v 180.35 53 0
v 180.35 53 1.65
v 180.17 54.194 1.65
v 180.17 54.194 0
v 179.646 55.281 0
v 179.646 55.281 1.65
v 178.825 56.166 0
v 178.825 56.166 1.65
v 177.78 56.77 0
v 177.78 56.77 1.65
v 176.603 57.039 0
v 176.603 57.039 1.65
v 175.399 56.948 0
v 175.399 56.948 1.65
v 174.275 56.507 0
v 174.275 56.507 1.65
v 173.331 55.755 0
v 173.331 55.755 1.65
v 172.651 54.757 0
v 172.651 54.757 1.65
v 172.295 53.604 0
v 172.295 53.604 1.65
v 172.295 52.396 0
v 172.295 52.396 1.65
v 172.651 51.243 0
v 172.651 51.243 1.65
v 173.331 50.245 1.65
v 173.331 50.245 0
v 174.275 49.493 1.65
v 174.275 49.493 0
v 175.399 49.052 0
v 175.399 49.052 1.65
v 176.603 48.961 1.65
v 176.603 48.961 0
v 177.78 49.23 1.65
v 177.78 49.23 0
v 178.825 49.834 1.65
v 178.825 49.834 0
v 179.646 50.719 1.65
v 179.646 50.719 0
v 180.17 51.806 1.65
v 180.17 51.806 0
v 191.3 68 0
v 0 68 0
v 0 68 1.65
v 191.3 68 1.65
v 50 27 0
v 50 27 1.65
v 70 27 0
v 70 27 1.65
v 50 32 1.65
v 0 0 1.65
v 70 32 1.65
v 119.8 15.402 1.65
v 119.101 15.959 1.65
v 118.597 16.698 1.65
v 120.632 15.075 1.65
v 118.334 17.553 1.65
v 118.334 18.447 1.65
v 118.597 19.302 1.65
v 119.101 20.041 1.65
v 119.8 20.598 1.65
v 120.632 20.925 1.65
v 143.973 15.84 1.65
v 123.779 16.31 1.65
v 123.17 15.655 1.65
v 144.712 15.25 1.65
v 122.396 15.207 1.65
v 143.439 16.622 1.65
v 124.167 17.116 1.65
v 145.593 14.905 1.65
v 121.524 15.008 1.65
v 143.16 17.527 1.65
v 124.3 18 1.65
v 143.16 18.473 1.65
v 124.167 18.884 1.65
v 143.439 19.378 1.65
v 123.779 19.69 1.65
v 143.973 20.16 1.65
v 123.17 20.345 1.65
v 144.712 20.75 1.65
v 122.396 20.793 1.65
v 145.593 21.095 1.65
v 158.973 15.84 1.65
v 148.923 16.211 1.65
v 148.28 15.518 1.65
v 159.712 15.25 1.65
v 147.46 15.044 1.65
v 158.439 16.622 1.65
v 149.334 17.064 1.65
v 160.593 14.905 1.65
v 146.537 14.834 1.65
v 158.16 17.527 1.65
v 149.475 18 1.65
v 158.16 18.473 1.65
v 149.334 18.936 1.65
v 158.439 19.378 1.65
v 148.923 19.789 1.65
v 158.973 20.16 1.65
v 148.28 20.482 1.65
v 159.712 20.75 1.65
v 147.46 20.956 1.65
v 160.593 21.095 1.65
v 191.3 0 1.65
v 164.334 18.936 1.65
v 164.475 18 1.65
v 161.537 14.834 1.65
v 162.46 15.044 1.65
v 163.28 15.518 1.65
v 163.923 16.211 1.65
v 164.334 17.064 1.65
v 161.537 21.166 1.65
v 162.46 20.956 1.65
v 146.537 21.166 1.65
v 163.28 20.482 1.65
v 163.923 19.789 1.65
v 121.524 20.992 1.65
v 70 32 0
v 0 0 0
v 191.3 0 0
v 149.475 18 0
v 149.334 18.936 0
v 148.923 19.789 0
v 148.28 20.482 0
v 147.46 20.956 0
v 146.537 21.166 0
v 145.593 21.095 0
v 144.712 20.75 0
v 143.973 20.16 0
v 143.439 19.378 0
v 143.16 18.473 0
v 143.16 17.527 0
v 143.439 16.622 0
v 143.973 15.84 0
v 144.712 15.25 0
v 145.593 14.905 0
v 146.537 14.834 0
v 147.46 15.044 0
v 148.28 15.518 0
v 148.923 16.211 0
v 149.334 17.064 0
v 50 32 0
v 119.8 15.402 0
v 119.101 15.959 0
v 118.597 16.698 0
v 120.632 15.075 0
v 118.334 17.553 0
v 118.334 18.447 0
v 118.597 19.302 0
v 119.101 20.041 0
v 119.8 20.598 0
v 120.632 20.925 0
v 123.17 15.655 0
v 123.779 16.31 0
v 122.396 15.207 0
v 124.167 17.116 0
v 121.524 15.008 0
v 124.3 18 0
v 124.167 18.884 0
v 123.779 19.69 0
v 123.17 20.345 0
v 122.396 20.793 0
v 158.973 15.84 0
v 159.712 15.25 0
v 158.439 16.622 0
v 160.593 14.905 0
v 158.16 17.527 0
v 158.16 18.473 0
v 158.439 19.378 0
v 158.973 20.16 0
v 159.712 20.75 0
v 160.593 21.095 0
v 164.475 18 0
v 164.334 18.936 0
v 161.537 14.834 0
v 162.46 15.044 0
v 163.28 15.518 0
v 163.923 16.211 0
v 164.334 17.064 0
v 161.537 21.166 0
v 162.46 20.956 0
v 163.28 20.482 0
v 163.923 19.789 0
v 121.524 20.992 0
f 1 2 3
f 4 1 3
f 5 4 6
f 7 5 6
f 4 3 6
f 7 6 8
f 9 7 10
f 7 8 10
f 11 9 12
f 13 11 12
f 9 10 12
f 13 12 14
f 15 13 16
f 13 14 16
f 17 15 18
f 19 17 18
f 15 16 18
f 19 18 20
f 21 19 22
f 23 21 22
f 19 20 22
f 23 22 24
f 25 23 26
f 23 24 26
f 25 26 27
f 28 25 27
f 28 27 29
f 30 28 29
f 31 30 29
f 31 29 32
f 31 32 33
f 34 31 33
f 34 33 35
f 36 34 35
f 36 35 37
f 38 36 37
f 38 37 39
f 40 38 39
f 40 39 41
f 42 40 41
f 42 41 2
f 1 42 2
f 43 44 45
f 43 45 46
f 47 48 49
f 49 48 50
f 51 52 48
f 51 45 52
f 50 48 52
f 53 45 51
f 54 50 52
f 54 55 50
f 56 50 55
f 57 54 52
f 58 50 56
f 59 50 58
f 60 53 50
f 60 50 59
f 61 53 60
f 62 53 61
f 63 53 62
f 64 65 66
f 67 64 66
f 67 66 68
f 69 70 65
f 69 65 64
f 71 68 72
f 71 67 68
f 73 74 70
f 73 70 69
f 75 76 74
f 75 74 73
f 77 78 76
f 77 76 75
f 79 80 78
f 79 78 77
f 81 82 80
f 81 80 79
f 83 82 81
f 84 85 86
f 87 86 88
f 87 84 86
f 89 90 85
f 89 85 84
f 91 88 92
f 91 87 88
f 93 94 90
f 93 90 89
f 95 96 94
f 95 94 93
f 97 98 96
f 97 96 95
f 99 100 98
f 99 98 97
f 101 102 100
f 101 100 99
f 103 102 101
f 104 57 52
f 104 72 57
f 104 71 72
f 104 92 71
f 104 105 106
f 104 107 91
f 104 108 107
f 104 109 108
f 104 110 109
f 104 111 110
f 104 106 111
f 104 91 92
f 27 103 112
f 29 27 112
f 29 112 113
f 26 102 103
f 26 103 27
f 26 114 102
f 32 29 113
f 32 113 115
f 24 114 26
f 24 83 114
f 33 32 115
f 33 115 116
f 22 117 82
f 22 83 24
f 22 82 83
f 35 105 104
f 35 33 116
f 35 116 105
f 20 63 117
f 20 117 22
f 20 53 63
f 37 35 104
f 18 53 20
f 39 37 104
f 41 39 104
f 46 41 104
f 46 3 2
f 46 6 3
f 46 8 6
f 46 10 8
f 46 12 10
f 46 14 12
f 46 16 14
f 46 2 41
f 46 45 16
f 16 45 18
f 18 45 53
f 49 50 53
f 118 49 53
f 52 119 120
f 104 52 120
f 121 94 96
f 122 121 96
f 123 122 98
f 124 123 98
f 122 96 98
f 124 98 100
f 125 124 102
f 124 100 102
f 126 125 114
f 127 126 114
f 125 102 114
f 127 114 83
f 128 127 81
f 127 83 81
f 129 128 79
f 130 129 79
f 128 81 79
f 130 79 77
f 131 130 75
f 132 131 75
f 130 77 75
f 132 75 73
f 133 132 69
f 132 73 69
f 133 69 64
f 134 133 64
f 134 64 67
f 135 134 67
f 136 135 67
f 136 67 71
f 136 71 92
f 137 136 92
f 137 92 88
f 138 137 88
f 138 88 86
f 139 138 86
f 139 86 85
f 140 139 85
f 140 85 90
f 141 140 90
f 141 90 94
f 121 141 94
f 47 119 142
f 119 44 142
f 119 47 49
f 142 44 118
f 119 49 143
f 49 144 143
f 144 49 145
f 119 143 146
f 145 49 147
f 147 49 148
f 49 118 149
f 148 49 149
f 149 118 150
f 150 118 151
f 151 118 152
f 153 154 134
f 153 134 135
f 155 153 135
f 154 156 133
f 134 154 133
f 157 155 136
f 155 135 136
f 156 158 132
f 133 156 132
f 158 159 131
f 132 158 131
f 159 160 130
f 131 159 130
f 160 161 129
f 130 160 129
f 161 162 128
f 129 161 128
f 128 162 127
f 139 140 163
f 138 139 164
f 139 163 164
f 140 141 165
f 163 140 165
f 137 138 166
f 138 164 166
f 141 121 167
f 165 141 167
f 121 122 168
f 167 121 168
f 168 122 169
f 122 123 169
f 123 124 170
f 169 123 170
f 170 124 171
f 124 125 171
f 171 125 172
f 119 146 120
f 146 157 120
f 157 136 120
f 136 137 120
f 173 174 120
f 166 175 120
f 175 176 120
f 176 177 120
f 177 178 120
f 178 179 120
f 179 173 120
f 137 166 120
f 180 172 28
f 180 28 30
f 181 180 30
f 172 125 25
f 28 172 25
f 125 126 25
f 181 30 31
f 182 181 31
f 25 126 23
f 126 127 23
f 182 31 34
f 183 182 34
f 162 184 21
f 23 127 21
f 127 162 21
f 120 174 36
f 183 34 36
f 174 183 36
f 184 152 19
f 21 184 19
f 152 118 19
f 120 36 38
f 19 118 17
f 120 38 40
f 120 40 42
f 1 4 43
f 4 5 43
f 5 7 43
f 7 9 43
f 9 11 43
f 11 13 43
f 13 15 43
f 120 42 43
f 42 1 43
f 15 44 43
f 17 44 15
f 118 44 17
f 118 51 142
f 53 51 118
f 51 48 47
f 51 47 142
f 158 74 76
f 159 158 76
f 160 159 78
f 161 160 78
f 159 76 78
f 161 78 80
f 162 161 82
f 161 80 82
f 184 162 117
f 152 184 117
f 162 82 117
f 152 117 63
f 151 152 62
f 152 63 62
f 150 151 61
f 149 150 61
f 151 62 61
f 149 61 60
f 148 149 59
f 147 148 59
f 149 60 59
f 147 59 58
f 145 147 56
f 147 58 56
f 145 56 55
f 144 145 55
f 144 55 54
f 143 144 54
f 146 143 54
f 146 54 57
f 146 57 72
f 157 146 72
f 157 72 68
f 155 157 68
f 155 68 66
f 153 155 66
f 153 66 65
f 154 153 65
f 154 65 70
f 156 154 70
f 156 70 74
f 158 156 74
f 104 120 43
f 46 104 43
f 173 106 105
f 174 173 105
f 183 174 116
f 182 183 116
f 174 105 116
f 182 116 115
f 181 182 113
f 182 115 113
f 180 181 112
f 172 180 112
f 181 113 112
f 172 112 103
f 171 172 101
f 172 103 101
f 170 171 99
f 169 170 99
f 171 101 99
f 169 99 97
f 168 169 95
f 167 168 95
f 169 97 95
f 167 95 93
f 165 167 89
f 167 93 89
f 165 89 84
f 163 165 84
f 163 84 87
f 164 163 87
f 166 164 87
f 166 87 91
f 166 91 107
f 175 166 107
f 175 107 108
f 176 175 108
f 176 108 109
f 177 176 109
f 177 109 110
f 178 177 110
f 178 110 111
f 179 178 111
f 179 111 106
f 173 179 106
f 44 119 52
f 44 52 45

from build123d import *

# Parameters (mm, degrees)
SKETCH_W      = 191.3
SKETCH_H      = 68
PAD_DEPTH     = 1.65
SKETCH001_R   = 4.05
SKETCH001_R_2 = 3
SKETCH001_R_3 = 3.175
SKETCH001_W   = 20
SKETCH001_H   = 5
POCKET_DEPTH  = 5


with BuildPart() as part:
    # Sketch → Pad (new body)
    with BuildSketch(Plane.XY):
        with Locations((95.65, 34)):
            Rectangle(SKETCH_W, SKETCH_H)
    extrude(amount=PAD_DEPTH)

    # Sketch001 (on Face6 of Pad) → Pocket (cut)
    with BuildSketch(Plane.XY.offset(1.65)):
        with Locations((176.3, 53)):
            Circle(SKETCH001_R)
        with Locations((121.3, 18)):
            Circle(SKETCH001_R_2)
        with Locations((146.3, 18)):
            Circle(SKETCH001_R_3)
        with Locations((161.3, 18)):
            Circle(SKETCH001_R_3)
        with Locations((60, 29.5)):
            Rectangle(SKETCH001_W, SKETCH001_H)
    extrude(amount=-POCKET_DEPTH, mode=Mode.SUBTRACT)


solid = part.part
